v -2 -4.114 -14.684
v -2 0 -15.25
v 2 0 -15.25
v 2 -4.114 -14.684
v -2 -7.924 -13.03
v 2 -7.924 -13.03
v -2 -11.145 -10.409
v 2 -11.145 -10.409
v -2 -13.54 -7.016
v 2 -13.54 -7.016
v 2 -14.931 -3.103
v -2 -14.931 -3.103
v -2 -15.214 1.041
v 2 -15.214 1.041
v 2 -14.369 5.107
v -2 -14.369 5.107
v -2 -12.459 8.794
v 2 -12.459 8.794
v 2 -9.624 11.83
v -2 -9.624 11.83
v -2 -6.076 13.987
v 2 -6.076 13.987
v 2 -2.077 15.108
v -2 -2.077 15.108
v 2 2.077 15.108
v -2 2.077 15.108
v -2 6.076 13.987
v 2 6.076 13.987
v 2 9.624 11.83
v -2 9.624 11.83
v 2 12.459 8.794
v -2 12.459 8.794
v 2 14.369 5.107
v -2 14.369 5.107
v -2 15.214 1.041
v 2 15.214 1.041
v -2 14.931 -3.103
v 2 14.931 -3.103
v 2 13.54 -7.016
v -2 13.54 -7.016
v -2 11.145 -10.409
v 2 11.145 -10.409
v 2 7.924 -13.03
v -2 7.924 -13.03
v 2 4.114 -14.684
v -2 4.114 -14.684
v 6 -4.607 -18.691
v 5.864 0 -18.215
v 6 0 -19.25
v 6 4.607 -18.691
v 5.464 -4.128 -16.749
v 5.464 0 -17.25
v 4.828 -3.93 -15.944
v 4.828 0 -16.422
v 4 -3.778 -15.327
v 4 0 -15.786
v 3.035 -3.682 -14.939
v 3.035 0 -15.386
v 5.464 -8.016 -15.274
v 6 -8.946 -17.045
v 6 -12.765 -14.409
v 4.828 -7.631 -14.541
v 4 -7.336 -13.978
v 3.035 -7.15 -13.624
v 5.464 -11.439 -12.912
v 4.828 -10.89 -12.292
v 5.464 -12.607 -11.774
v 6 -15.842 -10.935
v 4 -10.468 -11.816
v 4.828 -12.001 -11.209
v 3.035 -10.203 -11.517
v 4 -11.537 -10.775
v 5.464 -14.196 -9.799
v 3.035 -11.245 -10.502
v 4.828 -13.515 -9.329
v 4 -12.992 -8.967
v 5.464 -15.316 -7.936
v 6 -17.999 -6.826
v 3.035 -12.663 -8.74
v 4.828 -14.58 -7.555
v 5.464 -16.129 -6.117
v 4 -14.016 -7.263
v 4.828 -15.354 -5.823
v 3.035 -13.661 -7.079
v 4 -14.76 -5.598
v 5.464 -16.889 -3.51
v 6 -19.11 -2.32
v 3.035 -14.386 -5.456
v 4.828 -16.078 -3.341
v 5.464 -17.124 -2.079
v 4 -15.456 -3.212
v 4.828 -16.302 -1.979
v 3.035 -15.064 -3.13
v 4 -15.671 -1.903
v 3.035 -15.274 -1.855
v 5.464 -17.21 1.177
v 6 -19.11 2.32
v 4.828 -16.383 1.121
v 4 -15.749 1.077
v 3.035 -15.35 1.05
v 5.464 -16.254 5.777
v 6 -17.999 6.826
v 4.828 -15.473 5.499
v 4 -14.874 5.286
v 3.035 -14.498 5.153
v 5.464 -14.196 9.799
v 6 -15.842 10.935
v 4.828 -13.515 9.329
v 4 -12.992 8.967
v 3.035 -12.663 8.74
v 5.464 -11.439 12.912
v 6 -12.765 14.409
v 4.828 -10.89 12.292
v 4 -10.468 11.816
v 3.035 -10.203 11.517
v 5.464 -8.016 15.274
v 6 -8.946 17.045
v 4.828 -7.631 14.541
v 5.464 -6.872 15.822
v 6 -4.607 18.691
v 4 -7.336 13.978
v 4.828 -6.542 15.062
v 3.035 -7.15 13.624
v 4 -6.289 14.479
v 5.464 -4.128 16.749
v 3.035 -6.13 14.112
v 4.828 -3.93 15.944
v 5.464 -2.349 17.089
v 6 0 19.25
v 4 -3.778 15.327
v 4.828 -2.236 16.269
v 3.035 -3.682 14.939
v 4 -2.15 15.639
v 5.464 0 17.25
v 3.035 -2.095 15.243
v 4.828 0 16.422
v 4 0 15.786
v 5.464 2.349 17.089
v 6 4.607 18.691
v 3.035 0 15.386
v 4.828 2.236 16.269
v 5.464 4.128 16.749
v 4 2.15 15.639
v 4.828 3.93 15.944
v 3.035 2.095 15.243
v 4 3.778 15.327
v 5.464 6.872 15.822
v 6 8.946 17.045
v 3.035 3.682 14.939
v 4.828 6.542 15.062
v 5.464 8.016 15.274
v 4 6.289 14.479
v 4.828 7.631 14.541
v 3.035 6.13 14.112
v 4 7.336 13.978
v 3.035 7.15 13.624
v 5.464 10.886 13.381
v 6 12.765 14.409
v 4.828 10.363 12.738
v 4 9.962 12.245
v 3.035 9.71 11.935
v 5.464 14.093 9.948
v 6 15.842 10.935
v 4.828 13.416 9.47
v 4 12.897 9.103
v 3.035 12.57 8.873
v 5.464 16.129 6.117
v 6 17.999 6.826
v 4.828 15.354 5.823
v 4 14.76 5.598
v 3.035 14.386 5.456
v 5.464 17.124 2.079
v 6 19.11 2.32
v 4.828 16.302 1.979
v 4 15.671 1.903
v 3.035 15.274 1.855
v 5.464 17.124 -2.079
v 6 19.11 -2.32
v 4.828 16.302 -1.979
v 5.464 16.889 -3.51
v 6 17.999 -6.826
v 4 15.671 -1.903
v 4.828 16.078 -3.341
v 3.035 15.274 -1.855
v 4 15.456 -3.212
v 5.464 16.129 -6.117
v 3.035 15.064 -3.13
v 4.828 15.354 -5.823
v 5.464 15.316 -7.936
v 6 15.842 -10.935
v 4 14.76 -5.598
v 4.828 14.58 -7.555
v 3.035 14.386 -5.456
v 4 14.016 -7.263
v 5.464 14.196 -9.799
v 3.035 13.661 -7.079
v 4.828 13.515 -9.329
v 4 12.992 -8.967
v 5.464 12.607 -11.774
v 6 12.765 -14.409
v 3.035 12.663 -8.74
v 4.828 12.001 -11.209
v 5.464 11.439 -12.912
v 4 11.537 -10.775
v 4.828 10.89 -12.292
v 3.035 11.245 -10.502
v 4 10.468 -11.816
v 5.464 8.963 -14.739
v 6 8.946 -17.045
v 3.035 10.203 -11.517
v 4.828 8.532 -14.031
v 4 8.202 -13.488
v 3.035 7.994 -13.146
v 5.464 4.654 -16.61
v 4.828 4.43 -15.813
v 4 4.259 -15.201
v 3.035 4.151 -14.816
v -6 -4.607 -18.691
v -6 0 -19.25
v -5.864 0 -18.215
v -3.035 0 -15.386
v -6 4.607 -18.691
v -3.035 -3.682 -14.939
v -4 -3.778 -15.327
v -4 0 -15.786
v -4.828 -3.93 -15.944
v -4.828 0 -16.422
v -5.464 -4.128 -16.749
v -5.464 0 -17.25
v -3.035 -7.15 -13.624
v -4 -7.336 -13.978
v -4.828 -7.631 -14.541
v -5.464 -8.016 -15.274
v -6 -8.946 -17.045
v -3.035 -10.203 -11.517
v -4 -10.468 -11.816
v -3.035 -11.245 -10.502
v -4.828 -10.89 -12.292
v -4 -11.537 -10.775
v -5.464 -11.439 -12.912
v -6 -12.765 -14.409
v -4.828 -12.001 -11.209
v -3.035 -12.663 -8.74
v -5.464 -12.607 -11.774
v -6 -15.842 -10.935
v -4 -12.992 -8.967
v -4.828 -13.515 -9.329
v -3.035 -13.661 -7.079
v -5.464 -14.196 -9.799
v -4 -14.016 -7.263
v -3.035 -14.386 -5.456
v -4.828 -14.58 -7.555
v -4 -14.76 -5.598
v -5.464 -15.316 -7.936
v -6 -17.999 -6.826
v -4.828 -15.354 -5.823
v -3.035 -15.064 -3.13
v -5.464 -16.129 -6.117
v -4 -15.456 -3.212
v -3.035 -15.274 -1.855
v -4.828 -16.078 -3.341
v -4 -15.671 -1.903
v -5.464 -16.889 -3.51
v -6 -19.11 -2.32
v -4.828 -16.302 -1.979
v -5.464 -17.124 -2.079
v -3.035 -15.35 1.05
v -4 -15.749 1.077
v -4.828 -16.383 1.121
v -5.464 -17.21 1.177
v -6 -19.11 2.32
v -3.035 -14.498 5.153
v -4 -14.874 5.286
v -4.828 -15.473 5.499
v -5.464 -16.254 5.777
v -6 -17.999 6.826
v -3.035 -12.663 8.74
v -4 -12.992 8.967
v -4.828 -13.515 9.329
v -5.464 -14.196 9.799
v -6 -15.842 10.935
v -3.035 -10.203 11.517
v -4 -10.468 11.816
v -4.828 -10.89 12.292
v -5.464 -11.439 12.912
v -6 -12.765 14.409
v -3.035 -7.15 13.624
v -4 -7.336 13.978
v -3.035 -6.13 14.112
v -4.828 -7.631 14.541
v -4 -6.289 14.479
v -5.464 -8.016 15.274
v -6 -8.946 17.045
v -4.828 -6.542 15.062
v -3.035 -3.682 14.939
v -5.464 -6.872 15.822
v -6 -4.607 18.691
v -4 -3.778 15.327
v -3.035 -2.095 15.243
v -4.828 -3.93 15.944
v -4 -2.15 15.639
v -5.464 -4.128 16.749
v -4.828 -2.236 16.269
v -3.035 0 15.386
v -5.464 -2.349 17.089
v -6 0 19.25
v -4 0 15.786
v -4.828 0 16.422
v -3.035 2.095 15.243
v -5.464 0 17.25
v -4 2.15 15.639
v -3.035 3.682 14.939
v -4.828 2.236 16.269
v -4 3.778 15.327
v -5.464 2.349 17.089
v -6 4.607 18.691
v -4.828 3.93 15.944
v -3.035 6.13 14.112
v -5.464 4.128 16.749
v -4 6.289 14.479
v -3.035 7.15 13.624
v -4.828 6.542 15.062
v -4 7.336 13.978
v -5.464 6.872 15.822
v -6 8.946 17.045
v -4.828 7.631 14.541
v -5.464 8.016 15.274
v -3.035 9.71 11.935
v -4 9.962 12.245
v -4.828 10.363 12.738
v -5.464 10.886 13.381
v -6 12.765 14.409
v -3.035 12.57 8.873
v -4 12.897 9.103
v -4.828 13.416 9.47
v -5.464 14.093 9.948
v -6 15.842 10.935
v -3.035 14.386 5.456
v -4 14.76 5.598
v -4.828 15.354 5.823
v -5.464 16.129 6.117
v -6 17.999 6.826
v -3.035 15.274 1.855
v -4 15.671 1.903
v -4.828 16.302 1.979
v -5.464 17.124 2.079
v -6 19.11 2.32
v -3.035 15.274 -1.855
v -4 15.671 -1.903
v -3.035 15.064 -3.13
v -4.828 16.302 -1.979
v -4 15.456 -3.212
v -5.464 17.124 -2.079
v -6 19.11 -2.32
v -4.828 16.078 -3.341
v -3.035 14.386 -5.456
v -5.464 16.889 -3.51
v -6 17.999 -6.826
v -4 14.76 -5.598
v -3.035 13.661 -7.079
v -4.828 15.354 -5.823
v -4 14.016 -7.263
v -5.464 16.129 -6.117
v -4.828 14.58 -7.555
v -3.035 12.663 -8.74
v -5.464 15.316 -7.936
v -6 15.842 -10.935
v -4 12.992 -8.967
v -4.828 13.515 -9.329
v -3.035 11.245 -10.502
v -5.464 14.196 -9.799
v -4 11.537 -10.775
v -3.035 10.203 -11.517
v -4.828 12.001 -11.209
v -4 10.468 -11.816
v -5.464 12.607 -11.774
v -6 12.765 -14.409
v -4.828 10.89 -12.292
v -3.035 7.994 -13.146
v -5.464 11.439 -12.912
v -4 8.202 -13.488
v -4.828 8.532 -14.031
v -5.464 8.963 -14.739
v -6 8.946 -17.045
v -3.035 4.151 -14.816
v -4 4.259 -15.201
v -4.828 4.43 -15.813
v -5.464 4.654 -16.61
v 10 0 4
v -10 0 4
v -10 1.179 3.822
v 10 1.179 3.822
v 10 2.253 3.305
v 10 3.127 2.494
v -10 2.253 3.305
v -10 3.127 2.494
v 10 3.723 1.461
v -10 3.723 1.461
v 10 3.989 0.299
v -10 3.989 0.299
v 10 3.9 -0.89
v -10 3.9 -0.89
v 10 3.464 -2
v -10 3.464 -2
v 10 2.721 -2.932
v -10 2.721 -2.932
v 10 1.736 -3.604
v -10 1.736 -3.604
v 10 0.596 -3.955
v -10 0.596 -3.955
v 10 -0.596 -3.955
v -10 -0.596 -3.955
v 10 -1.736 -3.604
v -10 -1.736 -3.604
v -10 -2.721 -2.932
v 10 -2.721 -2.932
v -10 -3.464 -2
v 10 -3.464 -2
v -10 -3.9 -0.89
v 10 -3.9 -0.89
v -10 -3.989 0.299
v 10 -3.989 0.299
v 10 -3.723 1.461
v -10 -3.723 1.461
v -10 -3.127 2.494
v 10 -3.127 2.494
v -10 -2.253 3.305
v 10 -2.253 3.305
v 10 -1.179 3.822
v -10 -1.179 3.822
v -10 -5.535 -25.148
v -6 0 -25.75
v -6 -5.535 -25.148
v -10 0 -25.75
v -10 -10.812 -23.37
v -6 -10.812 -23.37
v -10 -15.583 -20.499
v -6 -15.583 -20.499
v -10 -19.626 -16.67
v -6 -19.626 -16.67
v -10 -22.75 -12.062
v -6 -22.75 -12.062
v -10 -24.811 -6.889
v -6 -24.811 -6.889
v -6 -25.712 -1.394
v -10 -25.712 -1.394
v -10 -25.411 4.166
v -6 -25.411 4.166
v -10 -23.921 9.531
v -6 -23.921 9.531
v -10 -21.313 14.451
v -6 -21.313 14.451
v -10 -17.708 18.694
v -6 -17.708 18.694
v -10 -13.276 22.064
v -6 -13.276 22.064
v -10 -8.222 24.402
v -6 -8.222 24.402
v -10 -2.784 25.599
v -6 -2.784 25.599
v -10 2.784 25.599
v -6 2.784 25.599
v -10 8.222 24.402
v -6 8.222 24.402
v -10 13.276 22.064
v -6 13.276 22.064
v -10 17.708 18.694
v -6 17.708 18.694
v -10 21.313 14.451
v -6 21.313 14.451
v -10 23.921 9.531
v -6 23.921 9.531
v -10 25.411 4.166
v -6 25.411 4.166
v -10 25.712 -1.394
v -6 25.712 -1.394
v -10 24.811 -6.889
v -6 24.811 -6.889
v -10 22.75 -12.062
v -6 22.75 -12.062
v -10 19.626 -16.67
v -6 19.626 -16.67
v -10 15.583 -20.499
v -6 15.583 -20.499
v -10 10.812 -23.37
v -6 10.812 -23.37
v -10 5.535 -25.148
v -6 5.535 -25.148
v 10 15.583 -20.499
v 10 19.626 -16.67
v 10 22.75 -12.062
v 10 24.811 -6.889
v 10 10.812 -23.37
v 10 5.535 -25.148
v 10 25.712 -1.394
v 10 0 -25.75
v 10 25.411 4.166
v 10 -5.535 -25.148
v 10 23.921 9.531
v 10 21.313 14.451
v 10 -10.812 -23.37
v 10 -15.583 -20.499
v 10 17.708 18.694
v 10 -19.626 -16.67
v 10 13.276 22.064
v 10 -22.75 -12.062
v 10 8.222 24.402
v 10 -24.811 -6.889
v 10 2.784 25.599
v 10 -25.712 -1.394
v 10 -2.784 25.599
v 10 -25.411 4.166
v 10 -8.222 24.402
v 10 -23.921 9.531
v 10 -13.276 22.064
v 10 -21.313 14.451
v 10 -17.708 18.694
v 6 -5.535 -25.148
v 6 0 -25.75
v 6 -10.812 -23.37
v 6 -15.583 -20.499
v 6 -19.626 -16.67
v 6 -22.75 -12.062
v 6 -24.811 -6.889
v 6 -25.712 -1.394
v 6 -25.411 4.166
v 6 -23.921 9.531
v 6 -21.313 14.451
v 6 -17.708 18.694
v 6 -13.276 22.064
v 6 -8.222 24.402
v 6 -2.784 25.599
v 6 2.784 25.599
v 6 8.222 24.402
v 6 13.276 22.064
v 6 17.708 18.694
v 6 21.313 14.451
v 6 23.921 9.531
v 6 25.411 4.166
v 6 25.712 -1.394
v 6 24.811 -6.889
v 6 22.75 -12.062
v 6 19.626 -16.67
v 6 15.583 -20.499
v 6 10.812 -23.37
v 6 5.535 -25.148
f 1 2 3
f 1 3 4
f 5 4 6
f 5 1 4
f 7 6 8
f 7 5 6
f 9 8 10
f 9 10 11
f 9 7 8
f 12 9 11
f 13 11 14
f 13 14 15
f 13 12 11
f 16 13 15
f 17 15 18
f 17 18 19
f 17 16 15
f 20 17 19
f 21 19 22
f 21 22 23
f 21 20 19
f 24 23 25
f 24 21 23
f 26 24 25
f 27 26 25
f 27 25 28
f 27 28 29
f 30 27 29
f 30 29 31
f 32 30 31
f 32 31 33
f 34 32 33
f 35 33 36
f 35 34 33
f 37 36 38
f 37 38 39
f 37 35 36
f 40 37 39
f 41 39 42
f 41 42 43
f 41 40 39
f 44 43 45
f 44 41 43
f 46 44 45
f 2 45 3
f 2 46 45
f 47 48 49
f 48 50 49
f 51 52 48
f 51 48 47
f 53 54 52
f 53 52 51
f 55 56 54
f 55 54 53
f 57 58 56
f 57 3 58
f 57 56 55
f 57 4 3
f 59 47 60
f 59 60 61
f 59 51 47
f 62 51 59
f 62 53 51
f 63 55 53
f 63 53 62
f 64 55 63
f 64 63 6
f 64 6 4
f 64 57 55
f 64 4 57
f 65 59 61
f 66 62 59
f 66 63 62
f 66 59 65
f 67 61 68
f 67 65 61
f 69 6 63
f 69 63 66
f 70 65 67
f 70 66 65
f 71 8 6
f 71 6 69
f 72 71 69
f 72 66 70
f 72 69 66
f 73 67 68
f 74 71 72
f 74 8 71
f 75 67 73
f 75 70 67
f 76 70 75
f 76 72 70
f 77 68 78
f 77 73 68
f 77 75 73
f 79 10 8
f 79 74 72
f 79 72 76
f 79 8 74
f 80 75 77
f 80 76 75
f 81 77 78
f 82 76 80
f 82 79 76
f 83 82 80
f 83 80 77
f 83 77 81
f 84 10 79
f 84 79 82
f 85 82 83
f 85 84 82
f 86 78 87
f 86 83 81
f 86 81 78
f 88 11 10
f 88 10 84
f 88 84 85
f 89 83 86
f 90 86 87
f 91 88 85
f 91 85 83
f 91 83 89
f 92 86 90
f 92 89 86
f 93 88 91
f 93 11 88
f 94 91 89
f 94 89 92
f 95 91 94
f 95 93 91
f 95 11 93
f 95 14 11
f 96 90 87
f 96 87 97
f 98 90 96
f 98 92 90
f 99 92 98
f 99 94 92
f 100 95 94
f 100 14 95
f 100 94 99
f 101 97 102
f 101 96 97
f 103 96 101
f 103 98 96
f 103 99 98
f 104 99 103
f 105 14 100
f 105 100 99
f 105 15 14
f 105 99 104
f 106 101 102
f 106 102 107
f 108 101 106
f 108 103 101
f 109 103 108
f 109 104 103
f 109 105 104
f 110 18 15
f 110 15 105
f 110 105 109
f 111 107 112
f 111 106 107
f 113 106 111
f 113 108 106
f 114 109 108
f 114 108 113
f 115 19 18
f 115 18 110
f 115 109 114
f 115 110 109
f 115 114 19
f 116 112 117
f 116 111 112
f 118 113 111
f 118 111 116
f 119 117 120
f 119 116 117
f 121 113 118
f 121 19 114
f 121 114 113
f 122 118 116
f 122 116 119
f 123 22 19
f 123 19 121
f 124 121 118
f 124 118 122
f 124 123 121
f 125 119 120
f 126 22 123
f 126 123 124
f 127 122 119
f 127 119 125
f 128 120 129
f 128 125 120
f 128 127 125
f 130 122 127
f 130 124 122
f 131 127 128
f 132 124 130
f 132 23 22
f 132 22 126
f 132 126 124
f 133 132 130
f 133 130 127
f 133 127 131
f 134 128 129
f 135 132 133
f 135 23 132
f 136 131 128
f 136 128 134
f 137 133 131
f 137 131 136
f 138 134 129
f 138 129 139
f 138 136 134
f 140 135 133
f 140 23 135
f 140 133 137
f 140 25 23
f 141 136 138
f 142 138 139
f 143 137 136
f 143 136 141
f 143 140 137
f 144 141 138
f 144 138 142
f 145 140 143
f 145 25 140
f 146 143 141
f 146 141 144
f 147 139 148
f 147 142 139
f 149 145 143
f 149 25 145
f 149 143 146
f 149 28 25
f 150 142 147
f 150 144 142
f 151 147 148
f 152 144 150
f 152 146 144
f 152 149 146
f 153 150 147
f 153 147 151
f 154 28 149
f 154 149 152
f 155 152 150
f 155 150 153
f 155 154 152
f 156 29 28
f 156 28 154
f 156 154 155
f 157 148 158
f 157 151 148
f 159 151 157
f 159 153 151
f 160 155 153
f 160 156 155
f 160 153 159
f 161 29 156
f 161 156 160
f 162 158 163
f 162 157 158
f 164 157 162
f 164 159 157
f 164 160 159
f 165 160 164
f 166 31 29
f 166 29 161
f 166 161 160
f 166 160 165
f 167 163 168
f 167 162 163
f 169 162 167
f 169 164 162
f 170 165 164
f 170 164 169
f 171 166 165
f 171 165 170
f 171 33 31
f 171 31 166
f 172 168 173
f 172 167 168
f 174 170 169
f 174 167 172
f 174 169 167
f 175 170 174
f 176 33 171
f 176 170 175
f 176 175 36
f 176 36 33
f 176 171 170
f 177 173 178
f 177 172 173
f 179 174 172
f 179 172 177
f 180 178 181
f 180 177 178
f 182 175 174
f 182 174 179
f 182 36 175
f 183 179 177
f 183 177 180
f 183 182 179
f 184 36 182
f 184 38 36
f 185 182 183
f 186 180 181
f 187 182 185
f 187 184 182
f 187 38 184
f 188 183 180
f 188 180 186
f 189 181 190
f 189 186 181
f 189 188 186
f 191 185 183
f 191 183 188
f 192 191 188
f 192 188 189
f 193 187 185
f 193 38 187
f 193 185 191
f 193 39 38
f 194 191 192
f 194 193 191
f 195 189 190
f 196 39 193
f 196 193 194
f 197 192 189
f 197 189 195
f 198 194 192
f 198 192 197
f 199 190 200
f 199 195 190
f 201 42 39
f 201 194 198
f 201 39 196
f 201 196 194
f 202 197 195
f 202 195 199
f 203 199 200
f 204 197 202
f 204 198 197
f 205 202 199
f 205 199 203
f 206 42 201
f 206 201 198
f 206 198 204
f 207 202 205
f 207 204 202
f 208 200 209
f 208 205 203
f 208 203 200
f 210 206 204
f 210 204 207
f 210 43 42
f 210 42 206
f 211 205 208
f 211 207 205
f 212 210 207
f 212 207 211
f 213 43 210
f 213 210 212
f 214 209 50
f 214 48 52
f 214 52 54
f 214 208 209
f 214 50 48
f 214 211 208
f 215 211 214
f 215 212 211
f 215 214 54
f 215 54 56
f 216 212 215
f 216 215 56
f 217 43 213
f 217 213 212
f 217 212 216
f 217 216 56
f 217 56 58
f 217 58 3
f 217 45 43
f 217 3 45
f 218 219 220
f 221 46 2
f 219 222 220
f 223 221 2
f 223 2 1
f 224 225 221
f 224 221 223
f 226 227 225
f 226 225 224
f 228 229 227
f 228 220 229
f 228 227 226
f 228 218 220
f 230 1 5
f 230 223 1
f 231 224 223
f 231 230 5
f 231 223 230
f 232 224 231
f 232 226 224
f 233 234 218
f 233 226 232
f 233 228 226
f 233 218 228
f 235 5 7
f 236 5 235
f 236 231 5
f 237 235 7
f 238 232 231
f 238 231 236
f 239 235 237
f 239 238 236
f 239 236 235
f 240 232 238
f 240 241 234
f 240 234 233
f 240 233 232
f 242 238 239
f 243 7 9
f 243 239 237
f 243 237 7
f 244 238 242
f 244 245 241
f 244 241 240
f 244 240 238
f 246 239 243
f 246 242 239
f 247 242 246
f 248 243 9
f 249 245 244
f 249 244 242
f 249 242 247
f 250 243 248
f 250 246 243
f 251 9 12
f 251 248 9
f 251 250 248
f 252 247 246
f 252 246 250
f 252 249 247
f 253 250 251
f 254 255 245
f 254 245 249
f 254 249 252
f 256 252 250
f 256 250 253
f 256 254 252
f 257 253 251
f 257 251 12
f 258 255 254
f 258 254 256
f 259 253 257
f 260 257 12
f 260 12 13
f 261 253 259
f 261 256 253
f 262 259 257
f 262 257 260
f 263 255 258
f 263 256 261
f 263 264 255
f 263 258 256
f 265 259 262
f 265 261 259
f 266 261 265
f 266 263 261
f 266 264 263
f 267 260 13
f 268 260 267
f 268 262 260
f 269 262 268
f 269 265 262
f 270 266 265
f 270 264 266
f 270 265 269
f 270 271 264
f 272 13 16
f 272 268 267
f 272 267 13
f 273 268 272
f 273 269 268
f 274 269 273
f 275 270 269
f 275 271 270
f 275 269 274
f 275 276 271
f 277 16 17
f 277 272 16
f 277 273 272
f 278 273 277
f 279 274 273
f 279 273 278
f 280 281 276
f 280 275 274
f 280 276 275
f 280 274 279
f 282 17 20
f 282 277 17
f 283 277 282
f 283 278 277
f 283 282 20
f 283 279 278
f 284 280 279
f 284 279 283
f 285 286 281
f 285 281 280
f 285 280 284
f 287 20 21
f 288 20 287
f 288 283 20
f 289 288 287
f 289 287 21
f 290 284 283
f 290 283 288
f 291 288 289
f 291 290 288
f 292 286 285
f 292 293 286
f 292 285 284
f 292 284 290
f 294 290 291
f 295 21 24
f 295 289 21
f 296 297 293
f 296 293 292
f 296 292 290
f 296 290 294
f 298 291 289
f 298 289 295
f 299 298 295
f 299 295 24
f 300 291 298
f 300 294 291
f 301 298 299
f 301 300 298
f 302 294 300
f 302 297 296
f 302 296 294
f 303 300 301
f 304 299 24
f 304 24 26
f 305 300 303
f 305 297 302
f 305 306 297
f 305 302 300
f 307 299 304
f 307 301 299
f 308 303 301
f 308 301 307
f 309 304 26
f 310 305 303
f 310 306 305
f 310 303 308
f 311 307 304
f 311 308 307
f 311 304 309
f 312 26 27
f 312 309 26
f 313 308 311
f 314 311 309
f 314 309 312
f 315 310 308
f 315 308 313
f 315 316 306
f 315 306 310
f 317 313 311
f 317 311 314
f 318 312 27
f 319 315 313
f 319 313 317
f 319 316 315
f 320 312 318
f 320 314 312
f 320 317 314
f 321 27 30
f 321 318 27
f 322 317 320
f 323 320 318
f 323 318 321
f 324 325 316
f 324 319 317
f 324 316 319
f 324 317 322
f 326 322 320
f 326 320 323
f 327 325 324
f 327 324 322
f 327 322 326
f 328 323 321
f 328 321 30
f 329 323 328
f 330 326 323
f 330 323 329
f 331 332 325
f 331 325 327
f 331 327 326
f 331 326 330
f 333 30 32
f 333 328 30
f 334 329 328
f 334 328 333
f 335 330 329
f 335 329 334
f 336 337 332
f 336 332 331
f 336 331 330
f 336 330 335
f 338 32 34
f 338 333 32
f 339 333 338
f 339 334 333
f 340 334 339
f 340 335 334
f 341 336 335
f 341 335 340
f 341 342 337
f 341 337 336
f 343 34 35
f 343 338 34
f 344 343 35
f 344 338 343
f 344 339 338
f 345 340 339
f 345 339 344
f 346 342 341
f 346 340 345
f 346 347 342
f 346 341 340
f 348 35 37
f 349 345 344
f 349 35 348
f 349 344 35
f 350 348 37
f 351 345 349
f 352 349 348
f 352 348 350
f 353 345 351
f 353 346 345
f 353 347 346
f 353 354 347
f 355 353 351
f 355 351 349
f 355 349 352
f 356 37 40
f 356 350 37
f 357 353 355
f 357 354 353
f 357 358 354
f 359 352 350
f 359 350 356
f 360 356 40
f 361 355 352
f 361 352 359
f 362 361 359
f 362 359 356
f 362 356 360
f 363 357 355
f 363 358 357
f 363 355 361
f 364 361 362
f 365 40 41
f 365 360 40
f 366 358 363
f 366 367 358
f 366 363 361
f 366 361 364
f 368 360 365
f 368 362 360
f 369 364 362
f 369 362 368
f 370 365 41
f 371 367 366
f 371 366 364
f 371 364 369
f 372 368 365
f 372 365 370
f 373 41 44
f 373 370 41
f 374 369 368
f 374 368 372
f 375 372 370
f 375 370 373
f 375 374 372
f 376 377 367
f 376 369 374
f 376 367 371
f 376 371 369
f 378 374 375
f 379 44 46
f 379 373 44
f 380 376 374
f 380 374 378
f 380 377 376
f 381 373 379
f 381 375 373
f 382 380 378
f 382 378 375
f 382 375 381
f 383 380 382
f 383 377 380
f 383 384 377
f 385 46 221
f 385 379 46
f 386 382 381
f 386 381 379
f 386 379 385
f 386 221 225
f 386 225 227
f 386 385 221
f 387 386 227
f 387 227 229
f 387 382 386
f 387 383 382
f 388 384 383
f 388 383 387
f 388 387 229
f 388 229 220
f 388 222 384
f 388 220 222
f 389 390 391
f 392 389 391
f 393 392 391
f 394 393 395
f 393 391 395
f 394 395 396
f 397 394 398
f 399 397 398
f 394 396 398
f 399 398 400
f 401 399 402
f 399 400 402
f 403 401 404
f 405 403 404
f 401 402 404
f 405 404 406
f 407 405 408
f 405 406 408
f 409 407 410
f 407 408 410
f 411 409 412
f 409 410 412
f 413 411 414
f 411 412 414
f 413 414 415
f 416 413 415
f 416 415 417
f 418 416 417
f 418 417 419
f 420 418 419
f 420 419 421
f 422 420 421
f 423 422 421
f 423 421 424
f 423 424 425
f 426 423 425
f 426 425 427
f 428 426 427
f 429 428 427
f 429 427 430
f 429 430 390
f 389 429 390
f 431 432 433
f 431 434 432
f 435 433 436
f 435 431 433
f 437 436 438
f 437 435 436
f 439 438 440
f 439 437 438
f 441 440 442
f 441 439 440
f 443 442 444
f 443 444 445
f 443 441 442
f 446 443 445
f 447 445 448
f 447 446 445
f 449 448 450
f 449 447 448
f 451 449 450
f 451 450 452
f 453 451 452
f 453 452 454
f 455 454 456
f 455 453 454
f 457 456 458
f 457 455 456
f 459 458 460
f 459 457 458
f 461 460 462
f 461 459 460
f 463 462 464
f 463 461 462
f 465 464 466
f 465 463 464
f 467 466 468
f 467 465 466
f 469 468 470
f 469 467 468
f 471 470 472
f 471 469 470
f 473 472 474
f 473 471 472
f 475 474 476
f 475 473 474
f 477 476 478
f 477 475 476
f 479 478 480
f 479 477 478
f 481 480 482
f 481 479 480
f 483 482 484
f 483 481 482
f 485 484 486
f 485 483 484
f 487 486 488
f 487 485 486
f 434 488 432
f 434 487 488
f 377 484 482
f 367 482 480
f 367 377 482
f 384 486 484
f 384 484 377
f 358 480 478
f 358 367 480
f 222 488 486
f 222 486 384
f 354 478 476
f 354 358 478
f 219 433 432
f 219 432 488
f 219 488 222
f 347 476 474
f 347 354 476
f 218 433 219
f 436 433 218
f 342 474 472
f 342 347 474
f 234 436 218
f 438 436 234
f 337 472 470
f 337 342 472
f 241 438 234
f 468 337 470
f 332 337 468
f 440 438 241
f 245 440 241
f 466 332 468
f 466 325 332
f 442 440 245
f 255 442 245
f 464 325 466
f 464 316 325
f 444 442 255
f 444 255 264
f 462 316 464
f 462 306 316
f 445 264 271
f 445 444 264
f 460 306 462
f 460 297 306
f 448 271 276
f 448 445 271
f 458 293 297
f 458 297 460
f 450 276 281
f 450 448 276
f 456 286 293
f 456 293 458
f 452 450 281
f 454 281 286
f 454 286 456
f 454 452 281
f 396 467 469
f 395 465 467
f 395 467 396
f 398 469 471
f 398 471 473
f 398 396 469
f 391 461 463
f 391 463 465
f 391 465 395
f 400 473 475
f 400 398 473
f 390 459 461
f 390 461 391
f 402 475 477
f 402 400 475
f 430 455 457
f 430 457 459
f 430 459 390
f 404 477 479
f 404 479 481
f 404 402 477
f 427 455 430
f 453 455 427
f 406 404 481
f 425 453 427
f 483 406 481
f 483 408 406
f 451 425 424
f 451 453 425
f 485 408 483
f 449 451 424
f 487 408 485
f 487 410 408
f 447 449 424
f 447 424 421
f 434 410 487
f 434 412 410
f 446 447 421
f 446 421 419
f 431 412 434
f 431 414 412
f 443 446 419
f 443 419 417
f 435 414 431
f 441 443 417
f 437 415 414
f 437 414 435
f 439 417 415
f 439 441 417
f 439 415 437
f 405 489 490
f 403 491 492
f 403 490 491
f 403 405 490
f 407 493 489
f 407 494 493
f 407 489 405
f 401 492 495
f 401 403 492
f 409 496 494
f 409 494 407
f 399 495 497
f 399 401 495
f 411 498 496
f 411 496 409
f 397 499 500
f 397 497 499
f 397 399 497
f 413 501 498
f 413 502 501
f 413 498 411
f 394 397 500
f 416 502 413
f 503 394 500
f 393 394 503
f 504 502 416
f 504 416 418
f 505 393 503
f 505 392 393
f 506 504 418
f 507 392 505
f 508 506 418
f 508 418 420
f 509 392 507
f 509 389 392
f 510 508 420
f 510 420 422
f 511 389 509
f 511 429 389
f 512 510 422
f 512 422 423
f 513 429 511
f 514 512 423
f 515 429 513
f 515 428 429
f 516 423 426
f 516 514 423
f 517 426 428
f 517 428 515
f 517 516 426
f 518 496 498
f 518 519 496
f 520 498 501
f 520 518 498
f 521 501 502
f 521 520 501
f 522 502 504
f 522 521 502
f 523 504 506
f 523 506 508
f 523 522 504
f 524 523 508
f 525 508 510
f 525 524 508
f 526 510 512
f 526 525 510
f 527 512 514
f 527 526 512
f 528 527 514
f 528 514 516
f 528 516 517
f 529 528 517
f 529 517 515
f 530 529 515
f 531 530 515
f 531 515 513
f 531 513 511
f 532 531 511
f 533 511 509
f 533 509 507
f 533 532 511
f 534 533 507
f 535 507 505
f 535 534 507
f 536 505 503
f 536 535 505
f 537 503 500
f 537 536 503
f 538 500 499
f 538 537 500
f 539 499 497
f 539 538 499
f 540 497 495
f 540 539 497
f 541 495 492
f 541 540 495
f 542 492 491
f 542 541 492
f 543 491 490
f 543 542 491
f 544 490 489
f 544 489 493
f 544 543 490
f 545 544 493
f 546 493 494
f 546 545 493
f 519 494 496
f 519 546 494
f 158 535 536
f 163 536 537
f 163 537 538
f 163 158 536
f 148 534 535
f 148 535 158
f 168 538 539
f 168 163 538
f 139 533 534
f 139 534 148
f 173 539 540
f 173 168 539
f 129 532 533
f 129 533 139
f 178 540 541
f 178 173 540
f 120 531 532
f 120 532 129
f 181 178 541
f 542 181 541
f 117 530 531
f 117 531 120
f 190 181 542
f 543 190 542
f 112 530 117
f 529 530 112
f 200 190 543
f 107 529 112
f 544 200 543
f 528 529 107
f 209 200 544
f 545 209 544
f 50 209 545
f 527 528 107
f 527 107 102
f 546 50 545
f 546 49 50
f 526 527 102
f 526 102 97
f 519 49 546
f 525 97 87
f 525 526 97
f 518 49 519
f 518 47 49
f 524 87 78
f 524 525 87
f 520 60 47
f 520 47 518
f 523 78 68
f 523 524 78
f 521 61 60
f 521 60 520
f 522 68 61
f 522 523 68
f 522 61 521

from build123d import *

# Parameters (mm, degrees)
FILLET1_R          = 4
SKETCH3_R          = 4
CUT_EXTRUDE1_DEPTH = 42.546660516


with BuildPart() as part:
    # Sketch1 → Revolve1 (revolve)
    with BuildSketch(Plane(origin=(0, 0, 0), x_dir=(-1, 0, 0), z_dir=(0, 1, 0)), mode=Mode.PRIVATE) as revolve1_sk:
        Polygon((-10, 0), (-10, 25.75), (-6, 25.75), (-6, 15.25), (6, 15.25), (6, 25.75), (10, 25.75), (10, 0), align=None)
    revolve(revolve1_sk.sketch.rotate(Axis((10, 0, 0), (-1, 0, 0)), 180), axis=Axis((10, 0, 0), (-1, 0, 0)))

    # Fillet1
    fillet1_edges = [part.edges().sort_by_distance(p)[0] for p in [
        (6, 0, 15.25),
        (-6, 0, 15.25),
    ]]
    fillet(fillet1_edges, radius=FILLET1_R)

    # Sketch3 → Cut-Extrude1 (cut, through all)
    with BuildSketch(Plane(origin=(-10, 0, 0), x_dir=(0, -1, 0), z_dir=(-1, 0, 0))):
        with Locations(Location((0, 0, 0), (0, 0, 90))):
            Circle(SKETCH3_R)
    extrude(amount=-CUT_EXTRUDE1_DEPTH, mode=Mode.SUBTRACT)


solid = part.part
